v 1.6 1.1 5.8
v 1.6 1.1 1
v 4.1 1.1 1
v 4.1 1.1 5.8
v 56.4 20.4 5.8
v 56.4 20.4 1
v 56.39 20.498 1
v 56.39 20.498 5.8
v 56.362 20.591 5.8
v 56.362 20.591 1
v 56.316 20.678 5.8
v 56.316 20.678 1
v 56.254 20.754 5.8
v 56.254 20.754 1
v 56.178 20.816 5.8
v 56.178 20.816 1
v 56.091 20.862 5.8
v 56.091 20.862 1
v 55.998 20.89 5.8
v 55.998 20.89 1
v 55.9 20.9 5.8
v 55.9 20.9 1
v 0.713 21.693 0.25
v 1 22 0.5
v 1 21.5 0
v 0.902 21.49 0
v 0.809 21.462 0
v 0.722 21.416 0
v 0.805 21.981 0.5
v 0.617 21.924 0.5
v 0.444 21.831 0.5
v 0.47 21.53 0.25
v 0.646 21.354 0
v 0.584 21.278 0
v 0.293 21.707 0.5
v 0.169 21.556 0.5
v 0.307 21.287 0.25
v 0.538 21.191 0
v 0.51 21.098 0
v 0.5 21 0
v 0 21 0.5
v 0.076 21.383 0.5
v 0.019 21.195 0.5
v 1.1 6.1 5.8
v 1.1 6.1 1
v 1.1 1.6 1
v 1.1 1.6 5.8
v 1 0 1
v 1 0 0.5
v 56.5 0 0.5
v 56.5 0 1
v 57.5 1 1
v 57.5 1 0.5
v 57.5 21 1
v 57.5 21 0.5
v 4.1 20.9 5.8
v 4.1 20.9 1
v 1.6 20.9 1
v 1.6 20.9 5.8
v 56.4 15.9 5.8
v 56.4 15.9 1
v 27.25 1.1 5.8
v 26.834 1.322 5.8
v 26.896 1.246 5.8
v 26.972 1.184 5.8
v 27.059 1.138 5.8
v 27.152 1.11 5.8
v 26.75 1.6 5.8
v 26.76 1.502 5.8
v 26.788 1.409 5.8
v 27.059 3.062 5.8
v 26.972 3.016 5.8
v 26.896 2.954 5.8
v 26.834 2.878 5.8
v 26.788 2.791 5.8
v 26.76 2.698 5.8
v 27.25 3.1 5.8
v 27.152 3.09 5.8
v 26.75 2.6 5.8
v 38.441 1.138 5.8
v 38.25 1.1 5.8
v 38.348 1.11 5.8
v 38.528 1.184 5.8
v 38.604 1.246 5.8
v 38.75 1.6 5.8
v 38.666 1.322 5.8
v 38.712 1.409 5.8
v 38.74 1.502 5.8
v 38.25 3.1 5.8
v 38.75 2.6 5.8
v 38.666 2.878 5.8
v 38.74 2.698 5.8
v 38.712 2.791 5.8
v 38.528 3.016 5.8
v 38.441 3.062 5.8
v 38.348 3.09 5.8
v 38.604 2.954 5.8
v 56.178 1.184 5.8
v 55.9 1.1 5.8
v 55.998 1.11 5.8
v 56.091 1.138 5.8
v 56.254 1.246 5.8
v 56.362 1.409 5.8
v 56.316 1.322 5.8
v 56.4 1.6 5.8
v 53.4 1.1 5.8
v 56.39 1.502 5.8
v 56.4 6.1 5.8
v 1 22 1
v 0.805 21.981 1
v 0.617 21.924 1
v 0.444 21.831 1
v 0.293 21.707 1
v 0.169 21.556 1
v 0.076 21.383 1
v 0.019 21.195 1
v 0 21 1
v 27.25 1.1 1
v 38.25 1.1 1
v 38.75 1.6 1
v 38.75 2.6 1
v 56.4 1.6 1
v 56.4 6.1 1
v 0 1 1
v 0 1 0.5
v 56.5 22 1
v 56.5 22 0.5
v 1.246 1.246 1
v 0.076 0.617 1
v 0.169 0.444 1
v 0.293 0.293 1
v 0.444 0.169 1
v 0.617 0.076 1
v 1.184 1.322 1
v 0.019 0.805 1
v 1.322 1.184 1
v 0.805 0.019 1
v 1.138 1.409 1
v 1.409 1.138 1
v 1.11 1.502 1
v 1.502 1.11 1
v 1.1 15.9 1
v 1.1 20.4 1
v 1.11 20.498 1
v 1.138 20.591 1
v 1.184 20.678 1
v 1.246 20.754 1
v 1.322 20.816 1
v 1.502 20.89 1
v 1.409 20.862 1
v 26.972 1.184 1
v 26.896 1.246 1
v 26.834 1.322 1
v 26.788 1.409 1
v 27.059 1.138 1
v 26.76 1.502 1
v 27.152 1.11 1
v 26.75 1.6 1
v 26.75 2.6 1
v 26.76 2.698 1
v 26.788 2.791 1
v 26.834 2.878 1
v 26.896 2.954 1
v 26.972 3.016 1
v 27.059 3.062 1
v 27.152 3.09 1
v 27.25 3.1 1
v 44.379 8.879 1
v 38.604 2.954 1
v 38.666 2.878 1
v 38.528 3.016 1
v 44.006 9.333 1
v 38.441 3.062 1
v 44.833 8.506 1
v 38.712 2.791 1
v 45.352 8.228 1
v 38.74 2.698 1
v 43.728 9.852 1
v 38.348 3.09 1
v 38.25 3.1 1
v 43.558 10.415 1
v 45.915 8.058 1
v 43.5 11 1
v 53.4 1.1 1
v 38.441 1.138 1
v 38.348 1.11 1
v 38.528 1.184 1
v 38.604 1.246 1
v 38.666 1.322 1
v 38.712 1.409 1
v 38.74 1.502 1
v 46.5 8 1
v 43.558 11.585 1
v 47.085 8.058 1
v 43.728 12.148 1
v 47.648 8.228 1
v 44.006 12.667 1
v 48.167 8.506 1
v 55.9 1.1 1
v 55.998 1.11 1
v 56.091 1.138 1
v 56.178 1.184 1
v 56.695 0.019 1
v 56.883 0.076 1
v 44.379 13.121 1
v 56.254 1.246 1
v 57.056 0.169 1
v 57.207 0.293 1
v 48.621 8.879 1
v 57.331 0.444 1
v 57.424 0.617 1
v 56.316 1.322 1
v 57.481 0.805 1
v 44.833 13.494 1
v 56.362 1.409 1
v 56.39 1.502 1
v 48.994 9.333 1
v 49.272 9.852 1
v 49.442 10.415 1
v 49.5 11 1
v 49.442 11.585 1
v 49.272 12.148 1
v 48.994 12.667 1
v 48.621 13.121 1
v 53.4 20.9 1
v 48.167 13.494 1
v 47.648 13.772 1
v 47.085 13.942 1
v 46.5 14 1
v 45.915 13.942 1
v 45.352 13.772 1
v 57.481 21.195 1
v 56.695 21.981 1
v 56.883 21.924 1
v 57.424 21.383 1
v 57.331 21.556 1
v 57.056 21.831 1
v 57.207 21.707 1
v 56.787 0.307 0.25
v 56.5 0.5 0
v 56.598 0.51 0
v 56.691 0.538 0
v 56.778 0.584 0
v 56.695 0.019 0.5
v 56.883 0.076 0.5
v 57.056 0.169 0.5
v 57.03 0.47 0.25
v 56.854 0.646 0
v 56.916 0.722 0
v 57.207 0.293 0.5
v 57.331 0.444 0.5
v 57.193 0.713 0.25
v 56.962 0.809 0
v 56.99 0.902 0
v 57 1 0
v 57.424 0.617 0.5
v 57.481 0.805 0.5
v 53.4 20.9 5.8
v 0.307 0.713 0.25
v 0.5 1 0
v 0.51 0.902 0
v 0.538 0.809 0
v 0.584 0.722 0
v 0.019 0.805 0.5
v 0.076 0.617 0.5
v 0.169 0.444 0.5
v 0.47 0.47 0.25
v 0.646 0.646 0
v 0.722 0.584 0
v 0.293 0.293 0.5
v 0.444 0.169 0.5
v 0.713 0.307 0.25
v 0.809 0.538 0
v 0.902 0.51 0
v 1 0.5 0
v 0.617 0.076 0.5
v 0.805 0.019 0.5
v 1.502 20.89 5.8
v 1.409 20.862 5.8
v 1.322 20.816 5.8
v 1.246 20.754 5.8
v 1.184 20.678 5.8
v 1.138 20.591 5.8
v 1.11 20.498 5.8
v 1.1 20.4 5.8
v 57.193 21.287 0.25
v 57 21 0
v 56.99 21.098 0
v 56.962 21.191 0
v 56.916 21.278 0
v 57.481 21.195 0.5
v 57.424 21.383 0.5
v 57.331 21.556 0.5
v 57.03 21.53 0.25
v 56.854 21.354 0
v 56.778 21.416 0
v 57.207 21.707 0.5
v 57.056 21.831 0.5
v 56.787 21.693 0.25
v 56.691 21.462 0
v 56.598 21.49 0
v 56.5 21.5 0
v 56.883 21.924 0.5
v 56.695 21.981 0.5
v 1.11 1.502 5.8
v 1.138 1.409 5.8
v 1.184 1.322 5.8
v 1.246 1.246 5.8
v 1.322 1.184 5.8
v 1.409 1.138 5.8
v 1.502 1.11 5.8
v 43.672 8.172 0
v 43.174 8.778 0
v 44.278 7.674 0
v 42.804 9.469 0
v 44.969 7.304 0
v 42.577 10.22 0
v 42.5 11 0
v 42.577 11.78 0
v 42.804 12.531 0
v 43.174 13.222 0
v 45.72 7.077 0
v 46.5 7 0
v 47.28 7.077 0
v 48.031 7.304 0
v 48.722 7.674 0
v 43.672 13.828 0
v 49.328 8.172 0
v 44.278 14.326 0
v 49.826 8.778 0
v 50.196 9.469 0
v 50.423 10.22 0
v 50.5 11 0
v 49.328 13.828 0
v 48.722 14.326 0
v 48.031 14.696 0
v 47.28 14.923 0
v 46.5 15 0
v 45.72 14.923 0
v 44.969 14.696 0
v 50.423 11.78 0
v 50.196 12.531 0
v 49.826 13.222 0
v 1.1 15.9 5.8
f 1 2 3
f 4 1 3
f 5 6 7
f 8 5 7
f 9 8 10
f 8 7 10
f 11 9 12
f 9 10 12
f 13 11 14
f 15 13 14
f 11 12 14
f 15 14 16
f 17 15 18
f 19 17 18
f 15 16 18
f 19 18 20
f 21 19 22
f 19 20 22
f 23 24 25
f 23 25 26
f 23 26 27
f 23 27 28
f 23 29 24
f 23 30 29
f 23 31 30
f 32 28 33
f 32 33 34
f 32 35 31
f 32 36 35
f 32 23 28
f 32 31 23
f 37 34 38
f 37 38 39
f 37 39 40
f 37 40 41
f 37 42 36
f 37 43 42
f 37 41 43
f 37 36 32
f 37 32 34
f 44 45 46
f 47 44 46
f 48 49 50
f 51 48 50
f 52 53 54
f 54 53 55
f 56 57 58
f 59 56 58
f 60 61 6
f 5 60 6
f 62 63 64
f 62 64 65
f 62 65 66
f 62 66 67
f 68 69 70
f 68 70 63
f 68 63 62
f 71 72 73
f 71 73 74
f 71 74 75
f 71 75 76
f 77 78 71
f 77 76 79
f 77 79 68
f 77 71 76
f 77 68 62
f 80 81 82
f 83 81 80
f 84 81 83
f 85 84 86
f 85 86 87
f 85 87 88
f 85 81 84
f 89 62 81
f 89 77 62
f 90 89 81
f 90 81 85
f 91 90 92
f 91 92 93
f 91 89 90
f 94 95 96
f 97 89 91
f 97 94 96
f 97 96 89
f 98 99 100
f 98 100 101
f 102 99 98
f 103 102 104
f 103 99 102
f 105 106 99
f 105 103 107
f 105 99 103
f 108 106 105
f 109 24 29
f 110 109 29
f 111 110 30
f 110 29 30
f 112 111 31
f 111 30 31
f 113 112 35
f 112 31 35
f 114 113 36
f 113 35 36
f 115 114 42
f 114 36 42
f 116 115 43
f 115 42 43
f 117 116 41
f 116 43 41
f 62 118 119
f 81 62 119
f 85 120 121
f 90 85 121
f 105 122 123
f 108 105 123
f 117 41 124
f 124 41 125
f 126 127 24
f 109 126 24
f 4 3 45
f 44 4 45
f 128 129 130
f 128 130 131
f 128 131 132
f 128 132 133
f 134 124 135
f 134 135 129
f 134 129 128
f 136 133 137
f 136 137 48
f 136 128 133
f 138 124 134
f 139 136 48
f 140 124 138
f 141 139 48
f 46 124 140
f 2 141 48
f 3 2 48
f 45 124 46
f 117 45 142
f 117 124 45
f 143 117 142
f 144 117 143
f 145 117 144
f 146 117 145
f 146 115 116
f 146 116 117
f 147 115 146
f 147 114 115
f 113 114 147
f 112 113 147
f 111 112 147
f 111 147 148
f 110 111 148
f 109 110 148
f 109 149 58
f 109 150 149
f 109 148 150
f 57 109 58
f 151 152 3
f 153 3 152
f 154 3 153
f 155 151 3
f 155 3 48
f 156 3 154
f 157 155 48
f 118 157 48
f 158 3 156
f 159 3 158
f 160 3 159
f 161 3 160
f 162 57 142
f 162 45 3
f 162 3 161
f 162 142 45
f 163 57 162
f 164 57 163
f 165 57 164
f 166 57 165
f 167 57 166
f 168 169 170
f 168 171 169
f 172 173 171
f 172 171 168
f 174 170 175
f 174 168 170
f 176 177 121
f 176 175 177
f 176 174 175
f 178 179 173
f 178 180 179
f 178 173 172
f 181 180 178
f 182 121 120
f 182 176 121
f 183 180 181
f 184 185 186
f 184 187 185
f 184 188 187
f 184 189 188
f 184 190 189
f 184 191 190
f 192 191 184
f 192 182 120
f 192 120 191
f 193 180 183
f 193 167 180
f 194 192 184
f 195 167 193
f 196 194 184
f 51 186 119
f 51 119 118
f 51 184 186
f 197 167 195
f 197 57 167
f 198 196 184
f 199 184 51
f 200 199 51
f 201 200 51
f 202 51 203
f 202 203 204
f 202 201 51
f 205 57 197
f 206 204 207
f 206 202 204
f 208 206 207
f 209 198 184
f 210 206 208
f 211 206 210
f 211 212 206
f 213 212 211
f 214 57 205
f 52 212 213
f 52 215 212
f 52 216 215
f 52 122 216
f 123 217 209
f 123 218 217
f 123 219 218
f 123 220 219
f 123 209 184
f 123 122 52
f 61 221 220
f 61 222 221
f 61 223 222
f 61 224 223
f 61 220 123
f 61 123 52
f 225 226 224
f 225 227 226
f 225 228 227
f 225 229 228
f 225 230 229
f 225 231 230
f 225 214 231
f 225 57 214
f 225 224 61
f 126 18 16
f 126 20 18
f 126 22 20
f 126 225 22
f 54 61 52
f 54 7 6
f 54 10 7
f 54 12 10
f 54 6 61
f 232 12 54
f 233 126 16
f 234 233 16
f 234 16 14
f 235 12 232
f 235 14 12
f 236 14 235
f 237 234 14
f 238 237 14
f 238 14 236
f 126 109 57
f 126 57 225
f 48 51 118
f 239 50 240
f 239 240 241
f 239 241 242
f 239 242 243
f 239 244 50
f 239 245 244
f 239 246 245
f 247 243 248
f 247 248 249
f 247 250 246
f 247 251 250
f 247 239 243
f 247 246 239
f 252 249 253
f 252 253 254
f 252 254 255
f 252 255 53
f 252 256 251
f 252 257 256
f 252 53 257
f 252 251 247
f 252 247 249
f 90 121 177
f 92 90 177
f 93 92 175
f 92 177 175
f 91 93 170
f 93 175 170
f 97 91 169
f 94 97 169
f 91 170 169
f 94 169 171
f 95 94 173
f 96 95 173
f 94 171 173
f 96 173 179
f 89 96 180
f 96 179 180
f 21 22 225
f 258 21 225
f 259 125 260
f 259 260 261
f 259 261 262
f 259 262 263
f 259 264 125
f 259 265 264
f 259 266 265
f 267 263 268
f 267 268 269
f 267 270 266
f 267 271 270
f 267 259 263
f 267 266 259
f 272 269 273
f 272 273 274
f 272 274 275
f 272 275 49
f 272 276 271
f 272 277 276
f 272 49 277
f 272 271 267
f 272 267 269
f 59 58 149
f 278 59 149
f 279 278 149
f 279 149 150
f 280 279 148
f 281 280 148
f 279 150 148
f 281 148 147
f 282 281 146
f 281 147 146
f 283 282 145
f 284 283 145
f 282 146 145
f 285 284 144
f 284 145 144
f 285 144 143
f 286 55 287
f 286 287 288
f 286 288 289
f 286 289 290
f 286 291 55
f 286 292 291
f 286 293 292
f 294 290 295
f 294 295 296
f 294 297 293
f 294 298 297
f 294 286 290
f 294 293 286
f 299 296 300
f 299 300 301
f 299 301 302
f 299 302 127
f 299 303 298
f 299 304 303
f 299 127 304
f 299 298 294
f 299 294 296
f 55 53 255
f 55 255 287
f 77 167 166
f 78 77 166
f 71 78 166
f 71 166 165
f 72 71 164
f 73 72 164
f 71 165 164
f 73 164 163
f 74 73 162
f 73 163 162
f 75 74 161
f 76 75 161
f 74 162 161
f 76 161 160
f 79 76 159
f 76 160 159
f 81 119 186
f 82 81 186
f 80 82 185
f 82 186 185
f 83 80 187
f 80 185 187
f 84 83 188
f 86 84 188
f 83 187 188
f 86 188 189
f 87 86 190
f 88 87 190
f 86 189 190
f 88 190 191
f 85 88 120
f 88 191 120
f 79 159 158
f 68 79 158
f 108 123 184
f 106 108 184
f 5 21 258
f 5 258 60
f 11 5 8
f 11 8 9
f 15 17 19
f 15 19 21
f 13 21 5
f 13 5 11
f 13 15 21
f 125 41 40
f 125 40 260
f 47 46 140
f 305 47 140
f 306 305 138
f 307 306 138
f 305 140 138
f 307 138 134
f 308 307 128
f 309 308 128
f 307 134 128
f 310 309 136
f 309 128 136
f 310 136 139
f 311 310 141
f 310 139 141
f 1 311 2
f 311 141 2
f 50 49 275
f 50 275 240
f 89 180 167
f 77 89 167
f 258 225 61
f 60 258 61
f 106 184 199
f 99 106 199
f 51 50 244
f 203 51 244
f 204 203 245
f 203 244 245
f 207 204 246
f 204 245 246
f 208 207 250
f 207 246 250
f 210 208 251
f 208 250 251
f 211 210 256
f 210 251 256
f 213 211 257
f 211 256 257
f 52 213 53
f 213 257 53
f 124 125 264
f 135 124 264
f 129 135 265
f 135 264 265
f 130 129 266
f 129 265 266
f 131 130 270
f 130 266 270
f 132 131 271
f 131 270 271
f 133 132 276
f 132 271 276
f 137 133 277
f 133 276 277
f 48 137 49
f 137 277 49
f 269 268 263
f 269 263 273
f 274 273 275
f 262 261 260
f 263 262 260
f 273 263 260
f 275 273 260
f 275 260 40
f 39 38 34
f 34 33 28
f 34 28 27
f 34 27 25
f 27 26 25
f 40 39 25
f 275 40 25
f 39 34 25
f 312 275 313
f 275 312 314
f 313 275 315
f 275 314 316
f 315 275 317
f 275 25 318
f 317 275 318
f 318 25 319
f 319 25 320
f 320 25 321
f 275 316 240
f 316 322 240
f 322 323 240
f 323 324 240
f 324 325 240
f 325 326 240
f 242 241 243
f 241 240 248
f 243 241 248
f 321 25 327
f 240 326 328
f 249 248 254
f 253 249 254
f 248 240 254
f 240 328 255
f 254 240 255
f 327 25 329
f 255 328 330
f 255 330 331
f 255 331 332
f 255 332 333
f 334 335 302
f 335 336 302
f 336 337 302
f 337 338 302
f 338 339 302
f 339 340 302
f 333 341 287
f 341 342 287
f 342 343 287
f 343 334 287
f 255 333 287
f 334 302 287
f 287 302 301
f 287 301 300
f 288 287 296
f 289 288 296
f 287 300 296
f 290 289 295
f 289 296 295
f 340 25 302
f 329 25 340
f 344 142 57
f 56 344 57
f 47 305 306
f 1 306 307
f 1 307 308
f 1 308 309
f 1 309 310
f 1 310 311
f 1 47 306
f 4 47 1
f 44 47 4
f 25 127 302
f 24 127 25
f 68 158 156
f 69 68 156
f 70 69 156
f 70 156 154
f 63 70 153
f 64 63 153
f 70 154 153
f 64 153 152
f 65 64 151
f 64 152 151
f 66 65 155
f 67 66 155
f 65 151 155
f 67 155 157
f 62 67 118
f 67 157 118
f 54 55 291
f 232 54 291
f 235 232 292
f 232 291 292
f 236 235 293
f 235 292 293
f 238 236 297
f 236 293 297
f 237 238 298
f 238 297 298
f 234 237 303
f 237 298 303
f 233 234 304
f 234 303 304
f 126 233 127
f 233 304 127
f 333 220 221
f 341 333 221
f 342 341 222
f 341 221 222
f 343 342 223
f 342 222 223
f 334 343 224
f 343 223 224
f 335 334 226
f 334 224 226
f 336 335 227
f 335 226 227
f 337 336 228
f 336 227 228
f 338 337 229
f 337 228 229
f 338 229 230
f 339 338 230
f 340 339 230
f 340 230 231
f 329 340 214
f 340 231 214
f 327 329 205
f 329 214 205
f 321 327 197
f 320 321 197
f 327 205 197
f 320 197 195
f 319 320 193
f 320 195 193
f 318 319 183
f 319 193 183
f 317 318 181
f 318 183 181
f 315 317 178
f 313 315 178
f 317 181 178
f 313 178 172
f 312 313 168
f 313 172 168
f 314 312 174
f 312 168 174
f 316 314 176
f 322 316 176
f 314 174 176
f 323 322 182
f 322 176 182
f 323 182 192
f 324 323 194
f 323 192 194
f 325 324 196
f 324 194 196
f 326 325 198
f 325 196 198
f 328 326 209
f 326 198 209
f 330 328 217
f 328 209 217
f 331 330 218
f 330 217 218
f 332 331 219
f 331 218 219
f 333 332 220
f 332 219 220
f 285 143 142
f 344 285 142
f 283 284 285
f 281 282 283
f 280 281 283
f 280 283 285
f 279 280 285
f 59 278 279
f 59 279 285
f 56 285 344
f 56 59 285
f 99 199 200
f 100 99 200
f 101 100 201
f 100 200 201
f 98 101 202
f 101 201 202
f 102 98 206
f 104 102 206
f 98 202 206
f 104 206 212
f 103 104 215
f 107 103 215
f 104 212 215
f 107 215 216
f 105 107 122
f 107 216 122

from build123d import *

# Parameters (mm, degrees)
F0_R     = 3
F1_DEPTH = 1
F3_DEPTH = 4.8
F4_SIZE  = 0.99999
F5_SIZE  = 0.5


# Not quite as in the source:
# - a fillet or chamfer is up to 0.001 mm smaller than in the source, because OpenCascade refuses the exact size


with BuildPart() as f1:
    # F0 (on Top) → F1 (new body)
    with BuildSketch(Plane.XY):
        with BuildLine():
            Line((56.5, 22), (1, 22))
            ThreePointArc((1, 22), (0.2928932188, 21.7071067812), (0, 21))
            Line((0, 21), (0, 1))
            ThreePointArc((0, 1), (0.2928932188, 0.2928932188), (1, 0))
            Line((1, 0), (56.5, 0))
            ThreePointArc((56.5, 0), (57.2071067812, 0.2928932188), (57.5, 1))
            Line((57.5, 1), (57.5, 21))
            ThreePointArc((57.5, 21), (57.2071067812, 21.7071067812), (56.5, 22))
        make_face()
        with Locations((46.5, 11)):
            Circle(F0_R, mode=Mode.SUBTRACT)
    extrude(amount=F1_DEPTH)

    # F2 (on face) → F3 (join)
    with BuildSketch(Plane.XY.offset(1)):
        with BuildLine():
            Line((1.1, 20.4), (1.1, 15.9))
            Line((1.1, 15.9), (4.1, 20.9))
            Line((4.1, 20.9), (1.6, 20.9))
            ThreePointArc((1.6, 20.9), (1.2464466094, 20.7535533906), (1.1, 20.4))
        make_face()
        with BuildLine():
            ThreePointArc((56.4, 20.4), (56.2535533906, 20.7535533906), (55.9, 20.9))
            Line((55.9, 20.9), (53.4, 20.9))
            Line((53.4, 20.9), (56.4, 15.9))
            Line((56.4, 15.9), (56.4, 20.4))
        make_face()
        with BuildLine():
            ThreePointArc((1.1, 1.6), (1.2464466094, 1.2464466094), (1.6, 1.1))
            Line((1.6, 1.1), (4.1, 1.1))
            Line((4.1, 1.1), (1.1, 6.1))
            Line((1.1, 6.1), (1.1, 1.6))
        make_face()
        with BuildLine():
            Line((53.4, 1.1), (55.9, 1.1))
            ThreePointArc((55.9, 1.1), (56.2535533906, 1.2464466094), (56.4, 1.6))
            Line((56.4, 1.6), (56.4, 6.1))
            Line((56.4, 6.1), (53.4, 1.1))
        make_face()
        with BuildLine():
            Line((38.25, 3.1), (27.25, 3.1))
            ThreePointArc((27.25, 3.1), (26.8964466094, 2.9535533906), (26.75, 2.6))
            Line((26.75, 2.6), (26.75, 1.6))
            ThreePointArc((26.75, 1.6), (26.8964466094, 1.2464466094), (27.25, 1.1))
            Line((27.25, 1.1), (38.25, 1.1))
            ThreePointArc((38.25, 1.1), (38.6035533906, 1.2464466094), (38.75, 1.6))
            Line((38.75, 1.6), (38.75, 2.6))
            ThreePointArc((38.75, 2.6), (38.6035533906, 2.9535533906), (38.25, 3.1))
        make_face()
    extrude(amount=F3_DEPTH)

    # F4 (size 1 in the source; OpenCascade refuses exactly that, so slightly less here)
    f4_edges = [f1.edges().sort_by_distance(p)[0] for p in [
        (43.5, 11, 0),
    ]]
    chamfer(f4_edges, length=F4_SIZE)

    # F5
    f5_edges = [f1.edges().sort_by_distance(p)[0] for p in [
        (28.75, 0, 0),
        (0, 11, 0),
        (0.292893, 0.292893, 0),
        (0.292893, 21.707107, 0),
        (28.75, 22, 0),
        (57.5, 11, 0),
        (57.207107, 0.292893, 0),
        (57.207107, 21.707107, 0),
    ]]
    chamfer(f5_edges, length=F5_SIZE)


solid = f1.part
